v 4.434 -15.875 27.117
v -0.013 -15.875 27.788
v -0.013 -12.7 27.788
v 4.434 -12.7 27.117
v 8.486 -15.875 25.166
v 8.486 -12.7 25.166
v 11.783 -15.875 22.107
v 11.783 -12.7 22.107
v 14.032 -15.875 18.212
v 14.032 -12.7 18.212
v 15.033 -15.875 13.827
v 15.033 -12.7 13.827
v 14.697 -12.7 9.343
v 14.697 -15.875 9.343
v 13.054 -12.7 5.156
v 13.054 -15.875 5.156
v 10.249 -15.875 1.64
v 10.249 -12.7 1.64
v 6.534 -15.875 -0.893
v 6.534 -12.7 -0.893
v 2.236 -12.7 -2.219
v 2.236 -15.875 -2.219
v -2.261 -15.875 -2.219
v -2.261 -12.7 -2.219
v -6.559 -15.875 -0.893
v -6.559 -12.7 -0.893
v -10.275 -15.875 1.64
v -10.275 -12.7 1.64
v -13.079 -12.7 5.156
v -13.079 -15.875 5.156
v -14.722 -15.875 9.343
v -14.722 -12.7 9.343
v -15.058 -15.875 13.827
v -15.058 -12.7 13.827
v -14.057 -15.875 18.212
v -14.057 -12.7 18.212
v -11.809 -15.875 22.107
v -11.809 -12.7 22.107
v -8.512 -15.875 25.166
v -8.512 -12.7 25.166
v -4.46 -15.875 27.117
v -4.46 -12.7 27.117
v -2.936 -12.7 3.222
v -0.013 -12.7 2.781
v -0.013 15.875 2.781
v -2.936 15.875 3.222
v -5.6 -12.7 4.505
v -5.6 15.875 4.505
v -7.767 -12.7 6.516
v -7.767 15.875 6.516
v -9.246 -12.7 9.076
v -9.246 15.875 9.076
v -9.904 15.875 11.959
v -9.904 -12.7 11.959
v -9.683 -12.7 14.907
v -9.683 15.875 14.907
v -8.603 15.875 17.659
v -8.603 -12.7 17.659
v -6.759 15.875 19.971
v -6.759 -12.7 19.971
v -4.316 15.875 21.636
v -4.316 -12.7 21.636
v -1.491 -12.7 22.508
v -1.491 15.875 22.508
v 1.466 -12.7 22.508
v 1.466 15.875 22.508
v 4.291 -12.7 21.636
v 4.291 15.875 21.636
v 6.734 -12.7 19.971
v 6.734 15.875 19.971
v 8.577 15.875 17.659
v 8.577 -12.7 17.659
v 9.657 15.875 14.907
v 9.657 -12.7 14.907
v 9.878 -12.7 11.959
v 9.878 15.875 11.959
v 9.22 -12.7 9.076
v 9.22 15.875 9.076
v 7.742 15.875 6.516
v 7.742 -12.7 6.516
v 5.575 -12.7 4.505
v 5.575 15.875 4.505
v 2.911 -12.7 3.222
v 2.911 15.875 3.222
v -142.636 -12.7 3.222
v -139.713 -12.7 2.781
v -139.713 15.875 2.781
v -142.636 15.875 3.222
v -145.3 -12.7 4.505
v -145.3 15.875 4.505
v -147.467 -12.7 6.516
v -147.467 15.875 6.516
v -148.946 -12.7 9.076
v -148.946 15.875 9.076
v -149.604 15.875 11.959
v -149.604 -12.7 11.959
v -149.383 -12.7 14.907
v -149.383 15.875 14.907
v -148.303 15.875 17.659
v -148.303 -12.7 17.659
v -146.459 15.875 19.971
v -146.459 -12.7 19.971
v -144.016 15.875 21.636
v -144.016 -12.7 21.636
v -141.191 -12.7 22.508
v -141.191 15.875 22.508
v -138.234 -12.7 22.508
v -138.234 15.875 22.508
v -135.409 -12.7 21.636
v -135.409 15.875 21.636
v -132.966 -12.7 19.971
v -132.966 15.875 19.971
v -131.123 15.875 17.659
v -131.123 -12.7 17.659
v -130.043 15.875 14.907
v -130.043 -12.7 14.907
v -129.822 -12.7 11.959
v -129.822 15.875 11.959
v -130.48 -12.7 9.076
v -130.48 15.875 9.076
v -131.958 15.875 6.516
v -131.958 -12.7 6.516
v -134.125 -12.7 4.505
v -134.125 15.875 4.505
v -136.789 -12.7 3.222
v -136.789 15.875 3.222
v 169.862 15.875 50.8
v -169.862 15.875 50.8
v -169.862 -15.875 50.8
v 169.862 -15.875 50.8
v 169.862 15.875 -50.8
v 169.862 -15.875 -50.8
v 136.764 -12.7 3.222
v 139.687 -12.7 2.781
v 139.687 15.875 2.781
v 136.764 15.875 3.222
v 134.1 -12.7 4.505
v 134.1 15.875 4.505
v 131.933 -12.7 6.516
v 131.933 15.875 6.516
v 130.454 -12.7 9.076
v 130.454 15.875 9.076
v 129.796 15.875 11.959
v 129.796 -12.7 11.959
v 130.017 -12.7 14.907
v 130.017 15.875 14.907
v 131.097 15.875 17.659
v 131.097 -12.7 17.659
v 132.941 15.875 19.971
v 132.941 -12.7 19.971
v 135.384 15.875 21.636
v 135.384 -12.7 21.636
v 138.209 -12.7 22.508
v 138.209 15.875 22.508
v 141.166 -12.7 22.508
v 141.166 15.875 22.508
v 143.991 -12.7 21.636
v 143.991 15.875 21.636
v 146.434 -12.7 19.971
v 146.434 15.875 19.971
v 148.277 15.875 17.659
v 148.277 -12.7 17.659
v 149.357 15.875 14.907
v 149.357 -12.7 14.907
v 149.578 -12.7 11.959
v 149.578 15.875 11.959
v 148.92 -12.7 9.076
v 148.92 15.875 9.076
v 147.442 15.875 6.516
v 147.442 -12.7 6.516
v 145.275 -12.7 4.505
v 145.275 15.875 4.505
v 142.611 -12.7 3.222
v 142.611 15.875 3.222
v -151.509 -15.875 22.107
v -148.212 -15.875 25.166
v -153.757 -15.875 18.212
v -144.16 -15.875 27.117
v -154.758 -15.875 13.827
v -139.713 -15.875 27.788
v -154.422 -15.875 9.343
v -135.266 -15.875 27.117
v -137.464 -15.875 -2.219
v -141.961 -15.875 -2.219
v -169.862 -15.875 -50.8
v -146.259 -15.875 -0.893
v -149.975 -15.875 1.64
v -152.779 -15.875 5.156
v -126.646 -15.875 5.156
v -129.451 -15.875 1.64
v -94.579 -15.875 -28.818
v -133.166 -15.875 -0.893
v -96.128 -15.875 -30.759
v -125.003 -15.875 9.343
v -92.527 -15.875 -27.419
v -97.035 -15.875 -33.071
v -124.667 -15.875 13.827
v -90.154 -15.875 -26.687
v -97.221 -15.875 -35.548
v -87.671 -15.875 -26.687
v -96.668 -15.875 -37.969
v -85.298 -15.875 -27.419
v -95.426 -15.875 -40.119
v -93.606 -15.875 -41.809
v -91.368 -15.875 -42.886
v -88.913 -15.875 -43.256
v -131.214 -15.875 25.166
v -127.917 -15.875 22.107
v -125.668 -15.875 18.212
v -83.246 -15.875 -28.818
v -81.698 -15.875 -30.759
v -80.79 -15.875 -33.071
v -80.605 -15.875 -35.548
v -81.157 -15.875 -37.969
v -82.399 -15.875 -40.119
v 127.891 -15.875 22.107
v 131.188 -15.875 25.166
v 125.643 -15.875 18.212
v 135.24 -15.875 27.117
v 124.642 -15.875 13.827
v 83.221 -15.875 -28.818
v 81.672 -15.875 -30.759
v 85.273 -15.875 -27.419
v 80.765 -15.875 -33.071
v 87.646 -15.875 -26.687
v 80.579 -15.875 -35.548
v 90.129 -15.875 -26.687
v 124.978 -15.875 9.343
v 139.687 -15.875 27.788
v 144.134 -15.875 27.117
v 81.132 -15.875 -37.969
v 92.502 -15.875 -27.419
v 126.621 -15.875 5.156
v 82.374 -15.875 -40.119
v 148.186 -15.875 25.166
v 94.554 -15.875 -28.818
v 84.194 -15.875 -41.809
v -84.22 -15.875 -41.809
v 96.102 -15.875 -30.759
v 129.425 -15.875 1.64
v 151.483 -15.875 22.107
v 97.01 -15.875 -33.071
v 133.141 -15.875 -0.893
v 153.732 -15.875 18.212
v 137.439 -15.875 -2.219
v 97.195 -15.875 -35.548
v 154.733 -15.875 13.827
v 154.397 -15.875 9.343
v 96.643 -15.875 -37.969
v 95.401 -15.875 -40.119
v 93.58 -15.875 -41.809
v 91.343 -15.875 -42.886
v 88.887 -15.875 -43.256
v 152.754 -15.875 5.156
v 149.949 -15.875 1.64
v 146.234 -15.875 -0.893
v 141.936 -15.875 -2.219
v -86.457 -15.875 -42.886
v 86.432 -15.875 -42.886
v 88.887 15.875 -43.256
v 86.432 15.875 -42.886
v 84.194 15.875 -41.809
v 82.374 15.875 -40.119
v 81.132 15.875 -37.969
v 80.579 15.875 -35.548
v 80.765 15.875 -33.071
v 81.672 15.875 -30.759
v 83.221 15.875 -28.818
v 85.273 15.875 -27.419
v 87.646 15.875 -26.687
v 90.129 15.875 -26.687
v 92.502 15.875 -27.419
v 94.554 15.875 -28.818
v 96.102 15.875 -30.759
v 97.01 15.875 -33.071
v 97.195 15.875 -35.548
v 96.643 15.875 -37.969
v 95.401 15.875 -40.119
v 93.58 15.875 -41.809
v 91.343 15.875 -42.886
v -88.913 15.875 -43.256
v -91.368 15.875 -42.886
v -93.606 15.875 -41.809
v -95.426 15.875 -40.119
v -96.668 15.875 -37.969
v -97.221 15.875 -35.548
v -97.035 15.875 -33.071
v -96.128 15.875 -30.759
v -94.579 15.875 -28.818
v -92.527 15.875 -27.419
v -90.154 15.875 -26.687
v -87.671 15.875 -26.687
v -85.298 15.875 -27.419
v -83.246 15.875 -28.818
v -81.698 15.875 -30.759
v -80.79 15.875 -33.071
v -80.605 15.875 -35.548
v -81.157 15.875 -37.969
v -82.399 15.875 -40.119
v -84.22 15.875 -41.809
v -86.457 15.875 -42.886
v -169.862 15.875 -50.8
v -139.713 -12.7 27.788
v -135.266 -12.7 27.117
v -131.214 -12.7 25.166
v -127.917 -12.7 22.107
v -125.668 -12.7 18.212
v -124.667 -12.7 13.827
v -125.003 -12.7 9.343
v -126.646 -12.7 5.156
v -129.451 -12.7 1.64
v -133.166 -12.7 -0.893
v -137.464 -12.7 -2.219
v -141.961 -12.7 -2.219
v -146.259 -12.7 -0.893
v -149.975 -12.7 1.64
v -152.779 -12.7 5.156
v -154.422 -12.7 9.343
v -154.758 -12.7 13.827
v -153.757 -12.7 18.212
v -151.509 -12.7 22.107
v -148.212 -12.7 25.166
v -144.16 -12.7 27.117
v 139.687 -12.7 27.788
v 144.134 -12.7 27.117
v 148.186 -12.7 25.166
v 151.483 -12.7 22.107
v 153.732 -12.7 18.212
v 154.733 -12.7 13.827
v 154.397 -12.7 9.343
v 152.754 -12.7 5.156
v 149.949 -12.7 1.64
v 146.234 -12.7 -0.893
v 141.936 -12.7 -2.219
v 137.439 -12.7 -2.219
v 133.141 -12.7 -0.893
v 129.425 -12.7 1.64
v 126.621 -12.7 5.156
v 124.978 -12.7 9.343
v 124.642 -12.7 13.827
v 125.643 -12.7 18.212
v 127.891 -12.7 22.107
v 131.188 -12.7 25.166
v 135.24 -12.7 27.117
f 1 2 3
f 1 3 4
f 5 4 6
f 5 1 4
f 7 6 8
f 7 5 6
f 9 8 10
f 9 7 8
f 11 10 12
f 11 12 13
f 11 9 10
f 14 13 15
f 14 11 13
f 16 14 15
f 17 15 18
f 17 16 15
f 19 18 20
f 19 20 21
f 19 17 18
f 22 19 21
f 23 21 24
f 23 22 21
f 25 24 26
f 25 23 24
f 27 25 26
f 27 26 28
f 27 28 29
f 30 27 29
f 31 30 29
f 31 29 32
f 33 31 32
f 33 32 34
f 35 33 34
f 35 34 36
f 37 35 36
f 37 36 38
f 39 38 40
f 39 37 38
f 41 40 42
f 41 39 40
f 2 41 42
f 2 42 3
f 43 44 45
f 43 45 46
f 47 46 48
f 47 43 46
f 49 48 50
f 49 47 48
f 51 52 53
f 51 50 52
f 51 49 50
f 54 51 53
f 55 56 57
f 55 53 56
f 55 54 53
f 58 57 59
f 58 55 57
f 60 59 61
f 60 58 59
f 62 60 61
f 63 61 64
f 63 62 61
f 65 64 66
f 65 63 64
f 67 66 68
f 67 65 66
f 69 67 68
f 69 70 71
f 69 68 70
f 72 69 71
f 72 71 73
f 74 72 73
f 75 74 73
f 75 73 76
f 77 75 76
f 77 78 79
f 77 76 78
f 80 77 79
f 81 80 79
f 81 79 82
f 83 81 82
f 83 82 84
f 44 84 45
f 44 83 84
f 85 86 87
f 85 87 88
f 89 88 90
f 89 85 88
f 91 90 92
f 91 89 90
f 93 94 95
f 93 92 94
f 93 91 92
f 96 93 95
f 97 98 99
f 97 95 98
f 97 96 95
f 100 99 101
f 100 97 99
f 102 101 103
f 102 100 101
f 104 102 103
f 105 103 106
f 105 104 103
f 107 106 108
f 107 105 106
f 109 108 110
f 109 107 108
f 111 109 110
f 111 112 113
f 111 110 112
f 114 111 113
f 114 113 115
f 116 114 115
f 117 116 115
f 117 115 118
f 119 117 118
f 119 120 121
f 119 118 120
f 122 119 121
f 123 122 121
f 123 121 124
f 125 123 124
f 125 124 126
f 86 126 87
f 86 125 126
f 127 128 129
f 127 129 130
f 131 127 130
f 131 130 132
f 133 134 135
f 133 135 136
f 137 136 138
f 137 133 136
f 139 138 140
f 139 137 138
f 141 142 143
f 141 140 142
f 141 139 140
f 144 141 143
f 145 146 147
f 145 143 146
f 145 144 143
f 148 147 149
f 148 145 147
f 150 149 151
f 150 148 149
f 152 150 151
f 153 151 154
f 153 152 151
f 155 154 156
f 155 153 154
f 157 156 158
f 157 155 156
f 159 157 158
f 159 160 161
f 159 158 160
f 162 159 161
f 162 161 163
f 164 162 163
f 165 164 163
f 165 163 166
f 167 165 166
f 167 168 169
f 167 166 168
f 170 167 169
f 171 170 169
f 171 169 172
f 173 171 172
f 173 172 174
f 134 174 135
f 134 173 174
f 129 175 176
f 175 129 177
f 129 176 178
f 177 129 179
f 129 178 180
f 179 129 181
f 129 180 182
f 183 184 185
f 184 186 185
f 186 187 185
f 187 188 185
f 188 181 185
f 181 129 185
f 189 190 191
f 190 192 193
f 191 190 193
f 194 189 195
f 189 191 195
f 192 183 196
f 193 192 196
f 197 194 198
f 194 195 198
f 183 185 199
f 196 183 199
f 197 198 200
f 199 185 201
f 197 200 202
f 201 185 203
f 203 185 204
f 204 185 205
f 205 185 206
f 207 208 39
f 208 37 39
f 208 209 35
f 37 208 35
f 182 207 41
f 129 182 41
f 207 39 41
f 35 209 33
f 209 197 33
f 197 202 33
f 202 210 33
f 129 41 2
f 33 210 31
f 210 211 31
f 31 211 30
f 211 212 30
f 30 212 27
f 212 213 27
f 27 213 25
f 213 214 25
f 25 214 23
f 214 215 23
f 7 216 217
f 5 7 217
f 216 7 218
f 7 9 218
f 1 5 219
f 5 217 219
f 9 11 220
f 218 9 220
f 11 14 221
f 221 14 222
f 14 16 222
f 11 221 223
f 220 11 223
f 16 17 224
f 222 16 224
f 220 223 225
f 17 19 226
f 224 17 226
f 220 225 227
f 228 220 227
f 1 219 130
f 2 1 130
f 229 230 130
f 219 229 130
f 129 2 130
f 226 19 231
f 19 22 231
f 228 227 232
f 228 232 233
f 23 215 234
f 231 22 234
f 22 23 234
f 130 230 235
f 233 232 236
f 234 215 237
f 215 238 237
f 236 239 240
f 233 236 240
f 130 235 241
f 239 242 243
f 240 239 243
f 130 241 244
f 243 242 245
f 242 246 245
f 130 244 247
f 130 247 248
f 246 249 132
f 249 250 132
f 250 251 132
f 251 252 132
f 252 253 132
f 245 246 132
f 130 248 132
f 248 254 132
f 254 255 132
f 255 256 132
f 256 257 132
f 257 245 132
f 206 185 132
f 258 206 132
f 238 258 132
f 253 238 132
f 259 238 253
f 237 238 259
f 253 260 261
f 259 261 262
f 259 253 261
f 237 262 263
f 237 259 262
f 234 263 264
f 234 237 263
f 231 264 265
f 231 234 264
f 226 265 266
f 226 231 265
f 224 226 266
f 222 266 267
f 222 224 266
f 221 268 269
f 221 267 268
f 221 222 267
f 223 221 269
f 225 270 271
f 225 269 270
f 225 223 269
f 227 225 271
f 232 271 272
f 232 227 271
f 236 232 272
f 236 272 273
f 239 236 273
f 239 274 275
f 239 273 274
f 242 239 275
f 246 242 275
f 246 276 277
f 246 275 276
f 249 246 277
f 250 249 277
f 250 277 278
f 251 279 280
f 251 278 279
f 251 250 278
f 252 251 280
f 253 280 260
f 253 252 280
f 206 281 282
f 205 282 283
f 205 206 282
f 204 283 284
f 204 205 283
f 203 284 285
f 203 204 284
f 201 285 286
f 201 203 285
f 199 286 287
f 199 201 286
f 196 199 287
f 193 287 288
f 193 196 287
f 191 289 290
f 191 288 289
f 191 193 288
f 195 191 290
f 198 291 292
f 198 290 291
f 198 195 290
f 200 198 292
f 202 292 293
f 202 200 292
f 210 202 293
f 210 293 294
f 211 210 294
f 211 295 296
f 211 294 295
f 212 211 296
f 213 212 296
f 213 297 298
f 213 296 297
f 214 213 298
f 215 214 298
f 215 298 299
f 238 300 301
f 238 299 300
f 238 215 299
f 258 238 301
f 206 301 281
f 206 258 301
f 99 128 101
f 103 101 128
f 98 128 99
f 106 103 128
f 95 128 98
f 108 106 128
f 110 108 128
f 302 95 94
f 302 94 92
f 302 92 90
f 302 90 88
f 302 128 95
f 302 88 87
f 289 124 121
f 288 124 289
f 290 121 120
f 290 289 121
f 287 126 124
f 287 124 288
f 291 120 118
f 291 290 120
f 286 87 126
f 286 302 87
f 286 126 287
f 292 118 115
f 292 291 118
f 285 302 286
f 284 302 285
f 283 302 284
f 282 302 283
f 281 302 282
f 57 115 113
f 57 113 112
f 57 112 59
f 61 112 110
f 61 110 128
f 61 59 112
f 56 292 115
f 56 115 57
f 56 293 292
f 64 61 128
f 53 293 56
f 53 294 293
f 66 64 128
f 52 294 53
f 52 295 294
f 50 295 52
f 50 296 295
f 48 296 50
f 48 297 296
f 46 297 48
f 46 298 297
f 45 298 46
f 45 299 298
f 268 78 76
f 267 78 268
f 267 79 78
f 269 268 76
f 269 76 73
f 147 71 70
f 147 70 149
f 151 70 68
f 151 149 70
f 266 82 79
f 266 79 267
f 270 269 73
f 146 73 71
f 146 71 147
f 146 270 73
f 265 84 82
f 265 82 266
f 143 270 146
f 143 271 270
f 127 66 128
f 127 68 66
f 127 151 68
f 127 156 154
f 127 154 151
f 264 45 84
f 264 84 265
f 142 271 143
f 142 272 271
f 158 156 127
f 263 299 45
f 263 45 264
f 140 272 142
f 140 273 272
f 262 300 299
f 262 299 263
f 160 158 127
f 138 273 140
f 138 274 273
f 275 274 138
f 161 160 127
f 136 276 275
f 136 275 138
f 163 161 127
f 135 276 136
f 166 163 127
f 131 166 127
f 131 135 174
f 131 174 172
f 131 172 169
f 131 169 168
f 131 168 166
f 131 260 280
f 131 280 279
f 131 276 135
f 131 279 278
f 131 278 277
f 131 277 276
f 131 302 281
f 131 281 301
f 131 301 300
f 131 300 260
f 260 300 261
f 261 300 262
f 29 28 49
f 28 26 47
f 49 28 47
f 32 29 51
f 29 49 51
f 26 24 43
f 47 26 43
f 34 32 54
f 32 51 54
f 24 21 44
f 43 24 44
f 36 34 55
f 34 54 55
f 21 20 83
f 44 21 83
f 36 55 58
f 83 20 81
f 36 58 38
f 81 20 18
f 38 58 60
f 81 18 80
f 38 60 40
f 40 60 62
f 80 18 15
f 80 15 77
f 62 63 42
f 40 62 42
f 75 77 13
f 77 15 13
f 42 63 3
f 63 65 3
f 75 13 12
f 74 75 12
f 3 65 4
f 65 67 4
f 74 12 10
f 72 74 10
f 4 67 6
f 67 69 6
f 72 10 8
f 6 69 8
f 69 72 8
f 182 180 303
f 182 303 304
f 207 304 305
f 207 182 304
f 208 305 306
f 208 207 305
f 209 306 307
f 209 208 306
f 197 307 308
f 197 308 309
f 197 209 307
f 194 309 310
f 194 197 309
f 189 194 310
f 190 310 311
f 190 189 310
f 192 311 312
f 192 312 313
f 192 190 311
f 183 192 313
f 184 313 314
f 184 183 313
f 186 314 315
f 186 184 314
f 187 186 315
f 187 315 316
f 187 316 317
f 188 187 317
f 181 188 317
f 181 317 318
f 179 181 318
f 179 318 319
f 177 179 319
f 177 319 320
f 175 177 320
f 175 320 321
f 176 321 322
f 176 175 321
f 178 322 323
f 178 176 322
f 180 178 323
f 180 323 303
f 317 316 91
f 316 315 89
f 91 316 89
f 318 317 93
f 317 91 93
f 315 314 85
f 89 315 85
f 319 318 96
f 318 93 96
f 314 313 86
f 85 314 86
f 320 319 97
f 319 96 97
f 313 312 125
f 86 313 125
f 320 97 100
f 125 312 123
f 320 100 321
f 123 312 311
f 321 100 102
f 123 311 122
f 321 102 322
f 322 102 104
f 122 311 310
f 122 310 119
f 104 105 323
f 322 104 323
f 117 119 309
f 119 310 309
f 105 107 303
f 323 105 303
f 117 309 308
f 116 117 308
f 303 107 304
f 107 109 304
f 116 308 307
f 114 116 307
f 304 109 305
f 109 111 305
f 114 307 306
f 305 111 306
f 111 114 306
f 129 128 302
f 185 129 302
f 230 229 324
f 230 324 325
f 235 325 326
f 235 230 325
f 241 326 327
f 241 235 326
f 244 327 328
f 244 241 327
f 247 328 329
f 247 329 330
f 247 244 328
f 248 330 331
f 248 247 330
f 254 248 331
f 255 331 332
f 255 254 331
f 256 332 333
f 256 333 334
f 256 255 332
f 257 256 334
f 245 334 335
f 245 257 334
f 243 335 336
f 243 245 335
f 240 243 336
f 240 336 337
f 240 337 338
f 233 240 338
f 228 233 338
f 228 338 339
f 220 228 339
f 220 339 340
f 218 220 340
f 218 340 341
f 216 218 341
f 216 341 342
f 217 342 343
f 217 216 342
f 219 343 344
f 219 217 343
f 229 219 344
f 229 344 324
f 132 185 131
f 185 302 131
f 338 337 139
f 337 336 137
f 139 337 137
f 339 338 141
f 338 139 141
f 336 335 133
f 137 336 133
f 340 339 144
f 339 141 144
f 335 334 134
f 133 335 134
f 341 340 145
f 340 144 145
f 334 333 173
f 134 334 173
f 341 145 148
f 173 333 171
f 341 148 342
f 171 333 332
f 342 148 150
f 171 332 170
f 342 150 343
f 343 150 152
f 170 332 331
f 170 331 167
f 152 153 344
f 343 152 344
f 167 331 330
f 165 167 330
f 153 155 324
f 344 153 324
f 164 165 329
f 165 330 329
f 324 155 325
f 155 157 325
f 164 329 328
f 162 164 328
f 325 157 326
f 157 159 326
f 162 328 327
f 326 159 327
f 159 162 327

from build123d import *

# Parameters (mm, degrees)
SKETCH1_W           = 339.725
SKETCH1_H           = 101.6
BOSS_EXTRUDE1_DEPTH = 15.875
CUT_EXTRUDE2_START  = -15.875
SKETCH2_R           = 9.9187
CUT_EXTRUDE2_DEPTH  = 63.5
CUT_EXTRUDE4_START  = -15.875
SKETCH3_R           = 15.0876
CUT_EXTRUDE4_DEPTH  = 3.175
CUT_EXTRUDE6_START  = -15.875
SKETCH4_R           = 8.3312
CUT_EXTRUDE6_DEPTH  = 63.5


with BuildPart() as part:
    # Sketch1 → Boss-Extrude1 (new, symmetric)
    with BuildSketch(Plane(origin=(0, 0, 0), x_dir=(1, 0, 0), z_dir=(0, 1, 0))):
        Rectangle(SKETCH1_W, SKETCH1_H)
    extrude(amount=BOSS_EXTRUDE1_DEPTH, both=True)

    # Sketch2 → Cut-Extrude2 (cut)
    with BuildSketch(Plane(origin=(0, 0, 0), x_dir=(1, 0, 0), z_dir=(0, 1, 0)).offset(CUT_EXTRUDE2_START)):
        with Locations(Location((-139.7127, -12.7, 0), (0, 0, 90))):
            Circle(SKETCH2_R)
        with Locations(Location((-0.0127, -12.7, 0), (0, 0, 90))):
            Circle(SKETCH2_R)
        with Locations(Location((139.6873, -12.7, 0), (0, 0, 90))):
            Circle(SKETCH2_R)
    extrude(amount=CUT_EXTRUDE2_DEPTH, mode=Mode.SUBTRACT)

    # Sketch3 → Cut-Extrude4 (cut)
    with BuildSketch(Plane(origin=(0, 0, 0), x_dir=(1, 0, 0), z_dir=(0, 1, 0)).offset(CUT_EXTRUDE4_START)):
        with Locations(Location((-139.7127, -12.7, 0), (0, 0, 270))):
            Circle(SKETCH3_R)
        with Locations(Location((-0.0127, -12.7, 0), (0, 0, 270))):
            Circle(SKETCH3_R)
        with Locations(Location((139.6873, -12.7, 0), (0, 0, 270))):
            Circle(SKETCH3_R)
    extrude(amount=CUT_EXTRUDE4_DEPTH, mode=Mode.SUBTRACT)

    # Sketch4 → Cut-Extrude6 (cut)
    with BuildSketch(Plane(origin=(0, 0, 0), x_dir=(1, 0, 0), z_dir=(0, 1, 0)).offset(CUT_EXTRUDE6_START)):
        with Locations(Location((-88.9127, 34.925, 0), (0, 0, 90))):
            Circle(SKETCH4_R)
        with Locations(Location((88.8873, 34.925, 0), (0, 0, 90))):
            Circle(SKETCH4_R)
    extrude(amount=CUT_EXTRUDE6_DEPTH, mode=Mode.SUBTRACT)


solid = part.part
